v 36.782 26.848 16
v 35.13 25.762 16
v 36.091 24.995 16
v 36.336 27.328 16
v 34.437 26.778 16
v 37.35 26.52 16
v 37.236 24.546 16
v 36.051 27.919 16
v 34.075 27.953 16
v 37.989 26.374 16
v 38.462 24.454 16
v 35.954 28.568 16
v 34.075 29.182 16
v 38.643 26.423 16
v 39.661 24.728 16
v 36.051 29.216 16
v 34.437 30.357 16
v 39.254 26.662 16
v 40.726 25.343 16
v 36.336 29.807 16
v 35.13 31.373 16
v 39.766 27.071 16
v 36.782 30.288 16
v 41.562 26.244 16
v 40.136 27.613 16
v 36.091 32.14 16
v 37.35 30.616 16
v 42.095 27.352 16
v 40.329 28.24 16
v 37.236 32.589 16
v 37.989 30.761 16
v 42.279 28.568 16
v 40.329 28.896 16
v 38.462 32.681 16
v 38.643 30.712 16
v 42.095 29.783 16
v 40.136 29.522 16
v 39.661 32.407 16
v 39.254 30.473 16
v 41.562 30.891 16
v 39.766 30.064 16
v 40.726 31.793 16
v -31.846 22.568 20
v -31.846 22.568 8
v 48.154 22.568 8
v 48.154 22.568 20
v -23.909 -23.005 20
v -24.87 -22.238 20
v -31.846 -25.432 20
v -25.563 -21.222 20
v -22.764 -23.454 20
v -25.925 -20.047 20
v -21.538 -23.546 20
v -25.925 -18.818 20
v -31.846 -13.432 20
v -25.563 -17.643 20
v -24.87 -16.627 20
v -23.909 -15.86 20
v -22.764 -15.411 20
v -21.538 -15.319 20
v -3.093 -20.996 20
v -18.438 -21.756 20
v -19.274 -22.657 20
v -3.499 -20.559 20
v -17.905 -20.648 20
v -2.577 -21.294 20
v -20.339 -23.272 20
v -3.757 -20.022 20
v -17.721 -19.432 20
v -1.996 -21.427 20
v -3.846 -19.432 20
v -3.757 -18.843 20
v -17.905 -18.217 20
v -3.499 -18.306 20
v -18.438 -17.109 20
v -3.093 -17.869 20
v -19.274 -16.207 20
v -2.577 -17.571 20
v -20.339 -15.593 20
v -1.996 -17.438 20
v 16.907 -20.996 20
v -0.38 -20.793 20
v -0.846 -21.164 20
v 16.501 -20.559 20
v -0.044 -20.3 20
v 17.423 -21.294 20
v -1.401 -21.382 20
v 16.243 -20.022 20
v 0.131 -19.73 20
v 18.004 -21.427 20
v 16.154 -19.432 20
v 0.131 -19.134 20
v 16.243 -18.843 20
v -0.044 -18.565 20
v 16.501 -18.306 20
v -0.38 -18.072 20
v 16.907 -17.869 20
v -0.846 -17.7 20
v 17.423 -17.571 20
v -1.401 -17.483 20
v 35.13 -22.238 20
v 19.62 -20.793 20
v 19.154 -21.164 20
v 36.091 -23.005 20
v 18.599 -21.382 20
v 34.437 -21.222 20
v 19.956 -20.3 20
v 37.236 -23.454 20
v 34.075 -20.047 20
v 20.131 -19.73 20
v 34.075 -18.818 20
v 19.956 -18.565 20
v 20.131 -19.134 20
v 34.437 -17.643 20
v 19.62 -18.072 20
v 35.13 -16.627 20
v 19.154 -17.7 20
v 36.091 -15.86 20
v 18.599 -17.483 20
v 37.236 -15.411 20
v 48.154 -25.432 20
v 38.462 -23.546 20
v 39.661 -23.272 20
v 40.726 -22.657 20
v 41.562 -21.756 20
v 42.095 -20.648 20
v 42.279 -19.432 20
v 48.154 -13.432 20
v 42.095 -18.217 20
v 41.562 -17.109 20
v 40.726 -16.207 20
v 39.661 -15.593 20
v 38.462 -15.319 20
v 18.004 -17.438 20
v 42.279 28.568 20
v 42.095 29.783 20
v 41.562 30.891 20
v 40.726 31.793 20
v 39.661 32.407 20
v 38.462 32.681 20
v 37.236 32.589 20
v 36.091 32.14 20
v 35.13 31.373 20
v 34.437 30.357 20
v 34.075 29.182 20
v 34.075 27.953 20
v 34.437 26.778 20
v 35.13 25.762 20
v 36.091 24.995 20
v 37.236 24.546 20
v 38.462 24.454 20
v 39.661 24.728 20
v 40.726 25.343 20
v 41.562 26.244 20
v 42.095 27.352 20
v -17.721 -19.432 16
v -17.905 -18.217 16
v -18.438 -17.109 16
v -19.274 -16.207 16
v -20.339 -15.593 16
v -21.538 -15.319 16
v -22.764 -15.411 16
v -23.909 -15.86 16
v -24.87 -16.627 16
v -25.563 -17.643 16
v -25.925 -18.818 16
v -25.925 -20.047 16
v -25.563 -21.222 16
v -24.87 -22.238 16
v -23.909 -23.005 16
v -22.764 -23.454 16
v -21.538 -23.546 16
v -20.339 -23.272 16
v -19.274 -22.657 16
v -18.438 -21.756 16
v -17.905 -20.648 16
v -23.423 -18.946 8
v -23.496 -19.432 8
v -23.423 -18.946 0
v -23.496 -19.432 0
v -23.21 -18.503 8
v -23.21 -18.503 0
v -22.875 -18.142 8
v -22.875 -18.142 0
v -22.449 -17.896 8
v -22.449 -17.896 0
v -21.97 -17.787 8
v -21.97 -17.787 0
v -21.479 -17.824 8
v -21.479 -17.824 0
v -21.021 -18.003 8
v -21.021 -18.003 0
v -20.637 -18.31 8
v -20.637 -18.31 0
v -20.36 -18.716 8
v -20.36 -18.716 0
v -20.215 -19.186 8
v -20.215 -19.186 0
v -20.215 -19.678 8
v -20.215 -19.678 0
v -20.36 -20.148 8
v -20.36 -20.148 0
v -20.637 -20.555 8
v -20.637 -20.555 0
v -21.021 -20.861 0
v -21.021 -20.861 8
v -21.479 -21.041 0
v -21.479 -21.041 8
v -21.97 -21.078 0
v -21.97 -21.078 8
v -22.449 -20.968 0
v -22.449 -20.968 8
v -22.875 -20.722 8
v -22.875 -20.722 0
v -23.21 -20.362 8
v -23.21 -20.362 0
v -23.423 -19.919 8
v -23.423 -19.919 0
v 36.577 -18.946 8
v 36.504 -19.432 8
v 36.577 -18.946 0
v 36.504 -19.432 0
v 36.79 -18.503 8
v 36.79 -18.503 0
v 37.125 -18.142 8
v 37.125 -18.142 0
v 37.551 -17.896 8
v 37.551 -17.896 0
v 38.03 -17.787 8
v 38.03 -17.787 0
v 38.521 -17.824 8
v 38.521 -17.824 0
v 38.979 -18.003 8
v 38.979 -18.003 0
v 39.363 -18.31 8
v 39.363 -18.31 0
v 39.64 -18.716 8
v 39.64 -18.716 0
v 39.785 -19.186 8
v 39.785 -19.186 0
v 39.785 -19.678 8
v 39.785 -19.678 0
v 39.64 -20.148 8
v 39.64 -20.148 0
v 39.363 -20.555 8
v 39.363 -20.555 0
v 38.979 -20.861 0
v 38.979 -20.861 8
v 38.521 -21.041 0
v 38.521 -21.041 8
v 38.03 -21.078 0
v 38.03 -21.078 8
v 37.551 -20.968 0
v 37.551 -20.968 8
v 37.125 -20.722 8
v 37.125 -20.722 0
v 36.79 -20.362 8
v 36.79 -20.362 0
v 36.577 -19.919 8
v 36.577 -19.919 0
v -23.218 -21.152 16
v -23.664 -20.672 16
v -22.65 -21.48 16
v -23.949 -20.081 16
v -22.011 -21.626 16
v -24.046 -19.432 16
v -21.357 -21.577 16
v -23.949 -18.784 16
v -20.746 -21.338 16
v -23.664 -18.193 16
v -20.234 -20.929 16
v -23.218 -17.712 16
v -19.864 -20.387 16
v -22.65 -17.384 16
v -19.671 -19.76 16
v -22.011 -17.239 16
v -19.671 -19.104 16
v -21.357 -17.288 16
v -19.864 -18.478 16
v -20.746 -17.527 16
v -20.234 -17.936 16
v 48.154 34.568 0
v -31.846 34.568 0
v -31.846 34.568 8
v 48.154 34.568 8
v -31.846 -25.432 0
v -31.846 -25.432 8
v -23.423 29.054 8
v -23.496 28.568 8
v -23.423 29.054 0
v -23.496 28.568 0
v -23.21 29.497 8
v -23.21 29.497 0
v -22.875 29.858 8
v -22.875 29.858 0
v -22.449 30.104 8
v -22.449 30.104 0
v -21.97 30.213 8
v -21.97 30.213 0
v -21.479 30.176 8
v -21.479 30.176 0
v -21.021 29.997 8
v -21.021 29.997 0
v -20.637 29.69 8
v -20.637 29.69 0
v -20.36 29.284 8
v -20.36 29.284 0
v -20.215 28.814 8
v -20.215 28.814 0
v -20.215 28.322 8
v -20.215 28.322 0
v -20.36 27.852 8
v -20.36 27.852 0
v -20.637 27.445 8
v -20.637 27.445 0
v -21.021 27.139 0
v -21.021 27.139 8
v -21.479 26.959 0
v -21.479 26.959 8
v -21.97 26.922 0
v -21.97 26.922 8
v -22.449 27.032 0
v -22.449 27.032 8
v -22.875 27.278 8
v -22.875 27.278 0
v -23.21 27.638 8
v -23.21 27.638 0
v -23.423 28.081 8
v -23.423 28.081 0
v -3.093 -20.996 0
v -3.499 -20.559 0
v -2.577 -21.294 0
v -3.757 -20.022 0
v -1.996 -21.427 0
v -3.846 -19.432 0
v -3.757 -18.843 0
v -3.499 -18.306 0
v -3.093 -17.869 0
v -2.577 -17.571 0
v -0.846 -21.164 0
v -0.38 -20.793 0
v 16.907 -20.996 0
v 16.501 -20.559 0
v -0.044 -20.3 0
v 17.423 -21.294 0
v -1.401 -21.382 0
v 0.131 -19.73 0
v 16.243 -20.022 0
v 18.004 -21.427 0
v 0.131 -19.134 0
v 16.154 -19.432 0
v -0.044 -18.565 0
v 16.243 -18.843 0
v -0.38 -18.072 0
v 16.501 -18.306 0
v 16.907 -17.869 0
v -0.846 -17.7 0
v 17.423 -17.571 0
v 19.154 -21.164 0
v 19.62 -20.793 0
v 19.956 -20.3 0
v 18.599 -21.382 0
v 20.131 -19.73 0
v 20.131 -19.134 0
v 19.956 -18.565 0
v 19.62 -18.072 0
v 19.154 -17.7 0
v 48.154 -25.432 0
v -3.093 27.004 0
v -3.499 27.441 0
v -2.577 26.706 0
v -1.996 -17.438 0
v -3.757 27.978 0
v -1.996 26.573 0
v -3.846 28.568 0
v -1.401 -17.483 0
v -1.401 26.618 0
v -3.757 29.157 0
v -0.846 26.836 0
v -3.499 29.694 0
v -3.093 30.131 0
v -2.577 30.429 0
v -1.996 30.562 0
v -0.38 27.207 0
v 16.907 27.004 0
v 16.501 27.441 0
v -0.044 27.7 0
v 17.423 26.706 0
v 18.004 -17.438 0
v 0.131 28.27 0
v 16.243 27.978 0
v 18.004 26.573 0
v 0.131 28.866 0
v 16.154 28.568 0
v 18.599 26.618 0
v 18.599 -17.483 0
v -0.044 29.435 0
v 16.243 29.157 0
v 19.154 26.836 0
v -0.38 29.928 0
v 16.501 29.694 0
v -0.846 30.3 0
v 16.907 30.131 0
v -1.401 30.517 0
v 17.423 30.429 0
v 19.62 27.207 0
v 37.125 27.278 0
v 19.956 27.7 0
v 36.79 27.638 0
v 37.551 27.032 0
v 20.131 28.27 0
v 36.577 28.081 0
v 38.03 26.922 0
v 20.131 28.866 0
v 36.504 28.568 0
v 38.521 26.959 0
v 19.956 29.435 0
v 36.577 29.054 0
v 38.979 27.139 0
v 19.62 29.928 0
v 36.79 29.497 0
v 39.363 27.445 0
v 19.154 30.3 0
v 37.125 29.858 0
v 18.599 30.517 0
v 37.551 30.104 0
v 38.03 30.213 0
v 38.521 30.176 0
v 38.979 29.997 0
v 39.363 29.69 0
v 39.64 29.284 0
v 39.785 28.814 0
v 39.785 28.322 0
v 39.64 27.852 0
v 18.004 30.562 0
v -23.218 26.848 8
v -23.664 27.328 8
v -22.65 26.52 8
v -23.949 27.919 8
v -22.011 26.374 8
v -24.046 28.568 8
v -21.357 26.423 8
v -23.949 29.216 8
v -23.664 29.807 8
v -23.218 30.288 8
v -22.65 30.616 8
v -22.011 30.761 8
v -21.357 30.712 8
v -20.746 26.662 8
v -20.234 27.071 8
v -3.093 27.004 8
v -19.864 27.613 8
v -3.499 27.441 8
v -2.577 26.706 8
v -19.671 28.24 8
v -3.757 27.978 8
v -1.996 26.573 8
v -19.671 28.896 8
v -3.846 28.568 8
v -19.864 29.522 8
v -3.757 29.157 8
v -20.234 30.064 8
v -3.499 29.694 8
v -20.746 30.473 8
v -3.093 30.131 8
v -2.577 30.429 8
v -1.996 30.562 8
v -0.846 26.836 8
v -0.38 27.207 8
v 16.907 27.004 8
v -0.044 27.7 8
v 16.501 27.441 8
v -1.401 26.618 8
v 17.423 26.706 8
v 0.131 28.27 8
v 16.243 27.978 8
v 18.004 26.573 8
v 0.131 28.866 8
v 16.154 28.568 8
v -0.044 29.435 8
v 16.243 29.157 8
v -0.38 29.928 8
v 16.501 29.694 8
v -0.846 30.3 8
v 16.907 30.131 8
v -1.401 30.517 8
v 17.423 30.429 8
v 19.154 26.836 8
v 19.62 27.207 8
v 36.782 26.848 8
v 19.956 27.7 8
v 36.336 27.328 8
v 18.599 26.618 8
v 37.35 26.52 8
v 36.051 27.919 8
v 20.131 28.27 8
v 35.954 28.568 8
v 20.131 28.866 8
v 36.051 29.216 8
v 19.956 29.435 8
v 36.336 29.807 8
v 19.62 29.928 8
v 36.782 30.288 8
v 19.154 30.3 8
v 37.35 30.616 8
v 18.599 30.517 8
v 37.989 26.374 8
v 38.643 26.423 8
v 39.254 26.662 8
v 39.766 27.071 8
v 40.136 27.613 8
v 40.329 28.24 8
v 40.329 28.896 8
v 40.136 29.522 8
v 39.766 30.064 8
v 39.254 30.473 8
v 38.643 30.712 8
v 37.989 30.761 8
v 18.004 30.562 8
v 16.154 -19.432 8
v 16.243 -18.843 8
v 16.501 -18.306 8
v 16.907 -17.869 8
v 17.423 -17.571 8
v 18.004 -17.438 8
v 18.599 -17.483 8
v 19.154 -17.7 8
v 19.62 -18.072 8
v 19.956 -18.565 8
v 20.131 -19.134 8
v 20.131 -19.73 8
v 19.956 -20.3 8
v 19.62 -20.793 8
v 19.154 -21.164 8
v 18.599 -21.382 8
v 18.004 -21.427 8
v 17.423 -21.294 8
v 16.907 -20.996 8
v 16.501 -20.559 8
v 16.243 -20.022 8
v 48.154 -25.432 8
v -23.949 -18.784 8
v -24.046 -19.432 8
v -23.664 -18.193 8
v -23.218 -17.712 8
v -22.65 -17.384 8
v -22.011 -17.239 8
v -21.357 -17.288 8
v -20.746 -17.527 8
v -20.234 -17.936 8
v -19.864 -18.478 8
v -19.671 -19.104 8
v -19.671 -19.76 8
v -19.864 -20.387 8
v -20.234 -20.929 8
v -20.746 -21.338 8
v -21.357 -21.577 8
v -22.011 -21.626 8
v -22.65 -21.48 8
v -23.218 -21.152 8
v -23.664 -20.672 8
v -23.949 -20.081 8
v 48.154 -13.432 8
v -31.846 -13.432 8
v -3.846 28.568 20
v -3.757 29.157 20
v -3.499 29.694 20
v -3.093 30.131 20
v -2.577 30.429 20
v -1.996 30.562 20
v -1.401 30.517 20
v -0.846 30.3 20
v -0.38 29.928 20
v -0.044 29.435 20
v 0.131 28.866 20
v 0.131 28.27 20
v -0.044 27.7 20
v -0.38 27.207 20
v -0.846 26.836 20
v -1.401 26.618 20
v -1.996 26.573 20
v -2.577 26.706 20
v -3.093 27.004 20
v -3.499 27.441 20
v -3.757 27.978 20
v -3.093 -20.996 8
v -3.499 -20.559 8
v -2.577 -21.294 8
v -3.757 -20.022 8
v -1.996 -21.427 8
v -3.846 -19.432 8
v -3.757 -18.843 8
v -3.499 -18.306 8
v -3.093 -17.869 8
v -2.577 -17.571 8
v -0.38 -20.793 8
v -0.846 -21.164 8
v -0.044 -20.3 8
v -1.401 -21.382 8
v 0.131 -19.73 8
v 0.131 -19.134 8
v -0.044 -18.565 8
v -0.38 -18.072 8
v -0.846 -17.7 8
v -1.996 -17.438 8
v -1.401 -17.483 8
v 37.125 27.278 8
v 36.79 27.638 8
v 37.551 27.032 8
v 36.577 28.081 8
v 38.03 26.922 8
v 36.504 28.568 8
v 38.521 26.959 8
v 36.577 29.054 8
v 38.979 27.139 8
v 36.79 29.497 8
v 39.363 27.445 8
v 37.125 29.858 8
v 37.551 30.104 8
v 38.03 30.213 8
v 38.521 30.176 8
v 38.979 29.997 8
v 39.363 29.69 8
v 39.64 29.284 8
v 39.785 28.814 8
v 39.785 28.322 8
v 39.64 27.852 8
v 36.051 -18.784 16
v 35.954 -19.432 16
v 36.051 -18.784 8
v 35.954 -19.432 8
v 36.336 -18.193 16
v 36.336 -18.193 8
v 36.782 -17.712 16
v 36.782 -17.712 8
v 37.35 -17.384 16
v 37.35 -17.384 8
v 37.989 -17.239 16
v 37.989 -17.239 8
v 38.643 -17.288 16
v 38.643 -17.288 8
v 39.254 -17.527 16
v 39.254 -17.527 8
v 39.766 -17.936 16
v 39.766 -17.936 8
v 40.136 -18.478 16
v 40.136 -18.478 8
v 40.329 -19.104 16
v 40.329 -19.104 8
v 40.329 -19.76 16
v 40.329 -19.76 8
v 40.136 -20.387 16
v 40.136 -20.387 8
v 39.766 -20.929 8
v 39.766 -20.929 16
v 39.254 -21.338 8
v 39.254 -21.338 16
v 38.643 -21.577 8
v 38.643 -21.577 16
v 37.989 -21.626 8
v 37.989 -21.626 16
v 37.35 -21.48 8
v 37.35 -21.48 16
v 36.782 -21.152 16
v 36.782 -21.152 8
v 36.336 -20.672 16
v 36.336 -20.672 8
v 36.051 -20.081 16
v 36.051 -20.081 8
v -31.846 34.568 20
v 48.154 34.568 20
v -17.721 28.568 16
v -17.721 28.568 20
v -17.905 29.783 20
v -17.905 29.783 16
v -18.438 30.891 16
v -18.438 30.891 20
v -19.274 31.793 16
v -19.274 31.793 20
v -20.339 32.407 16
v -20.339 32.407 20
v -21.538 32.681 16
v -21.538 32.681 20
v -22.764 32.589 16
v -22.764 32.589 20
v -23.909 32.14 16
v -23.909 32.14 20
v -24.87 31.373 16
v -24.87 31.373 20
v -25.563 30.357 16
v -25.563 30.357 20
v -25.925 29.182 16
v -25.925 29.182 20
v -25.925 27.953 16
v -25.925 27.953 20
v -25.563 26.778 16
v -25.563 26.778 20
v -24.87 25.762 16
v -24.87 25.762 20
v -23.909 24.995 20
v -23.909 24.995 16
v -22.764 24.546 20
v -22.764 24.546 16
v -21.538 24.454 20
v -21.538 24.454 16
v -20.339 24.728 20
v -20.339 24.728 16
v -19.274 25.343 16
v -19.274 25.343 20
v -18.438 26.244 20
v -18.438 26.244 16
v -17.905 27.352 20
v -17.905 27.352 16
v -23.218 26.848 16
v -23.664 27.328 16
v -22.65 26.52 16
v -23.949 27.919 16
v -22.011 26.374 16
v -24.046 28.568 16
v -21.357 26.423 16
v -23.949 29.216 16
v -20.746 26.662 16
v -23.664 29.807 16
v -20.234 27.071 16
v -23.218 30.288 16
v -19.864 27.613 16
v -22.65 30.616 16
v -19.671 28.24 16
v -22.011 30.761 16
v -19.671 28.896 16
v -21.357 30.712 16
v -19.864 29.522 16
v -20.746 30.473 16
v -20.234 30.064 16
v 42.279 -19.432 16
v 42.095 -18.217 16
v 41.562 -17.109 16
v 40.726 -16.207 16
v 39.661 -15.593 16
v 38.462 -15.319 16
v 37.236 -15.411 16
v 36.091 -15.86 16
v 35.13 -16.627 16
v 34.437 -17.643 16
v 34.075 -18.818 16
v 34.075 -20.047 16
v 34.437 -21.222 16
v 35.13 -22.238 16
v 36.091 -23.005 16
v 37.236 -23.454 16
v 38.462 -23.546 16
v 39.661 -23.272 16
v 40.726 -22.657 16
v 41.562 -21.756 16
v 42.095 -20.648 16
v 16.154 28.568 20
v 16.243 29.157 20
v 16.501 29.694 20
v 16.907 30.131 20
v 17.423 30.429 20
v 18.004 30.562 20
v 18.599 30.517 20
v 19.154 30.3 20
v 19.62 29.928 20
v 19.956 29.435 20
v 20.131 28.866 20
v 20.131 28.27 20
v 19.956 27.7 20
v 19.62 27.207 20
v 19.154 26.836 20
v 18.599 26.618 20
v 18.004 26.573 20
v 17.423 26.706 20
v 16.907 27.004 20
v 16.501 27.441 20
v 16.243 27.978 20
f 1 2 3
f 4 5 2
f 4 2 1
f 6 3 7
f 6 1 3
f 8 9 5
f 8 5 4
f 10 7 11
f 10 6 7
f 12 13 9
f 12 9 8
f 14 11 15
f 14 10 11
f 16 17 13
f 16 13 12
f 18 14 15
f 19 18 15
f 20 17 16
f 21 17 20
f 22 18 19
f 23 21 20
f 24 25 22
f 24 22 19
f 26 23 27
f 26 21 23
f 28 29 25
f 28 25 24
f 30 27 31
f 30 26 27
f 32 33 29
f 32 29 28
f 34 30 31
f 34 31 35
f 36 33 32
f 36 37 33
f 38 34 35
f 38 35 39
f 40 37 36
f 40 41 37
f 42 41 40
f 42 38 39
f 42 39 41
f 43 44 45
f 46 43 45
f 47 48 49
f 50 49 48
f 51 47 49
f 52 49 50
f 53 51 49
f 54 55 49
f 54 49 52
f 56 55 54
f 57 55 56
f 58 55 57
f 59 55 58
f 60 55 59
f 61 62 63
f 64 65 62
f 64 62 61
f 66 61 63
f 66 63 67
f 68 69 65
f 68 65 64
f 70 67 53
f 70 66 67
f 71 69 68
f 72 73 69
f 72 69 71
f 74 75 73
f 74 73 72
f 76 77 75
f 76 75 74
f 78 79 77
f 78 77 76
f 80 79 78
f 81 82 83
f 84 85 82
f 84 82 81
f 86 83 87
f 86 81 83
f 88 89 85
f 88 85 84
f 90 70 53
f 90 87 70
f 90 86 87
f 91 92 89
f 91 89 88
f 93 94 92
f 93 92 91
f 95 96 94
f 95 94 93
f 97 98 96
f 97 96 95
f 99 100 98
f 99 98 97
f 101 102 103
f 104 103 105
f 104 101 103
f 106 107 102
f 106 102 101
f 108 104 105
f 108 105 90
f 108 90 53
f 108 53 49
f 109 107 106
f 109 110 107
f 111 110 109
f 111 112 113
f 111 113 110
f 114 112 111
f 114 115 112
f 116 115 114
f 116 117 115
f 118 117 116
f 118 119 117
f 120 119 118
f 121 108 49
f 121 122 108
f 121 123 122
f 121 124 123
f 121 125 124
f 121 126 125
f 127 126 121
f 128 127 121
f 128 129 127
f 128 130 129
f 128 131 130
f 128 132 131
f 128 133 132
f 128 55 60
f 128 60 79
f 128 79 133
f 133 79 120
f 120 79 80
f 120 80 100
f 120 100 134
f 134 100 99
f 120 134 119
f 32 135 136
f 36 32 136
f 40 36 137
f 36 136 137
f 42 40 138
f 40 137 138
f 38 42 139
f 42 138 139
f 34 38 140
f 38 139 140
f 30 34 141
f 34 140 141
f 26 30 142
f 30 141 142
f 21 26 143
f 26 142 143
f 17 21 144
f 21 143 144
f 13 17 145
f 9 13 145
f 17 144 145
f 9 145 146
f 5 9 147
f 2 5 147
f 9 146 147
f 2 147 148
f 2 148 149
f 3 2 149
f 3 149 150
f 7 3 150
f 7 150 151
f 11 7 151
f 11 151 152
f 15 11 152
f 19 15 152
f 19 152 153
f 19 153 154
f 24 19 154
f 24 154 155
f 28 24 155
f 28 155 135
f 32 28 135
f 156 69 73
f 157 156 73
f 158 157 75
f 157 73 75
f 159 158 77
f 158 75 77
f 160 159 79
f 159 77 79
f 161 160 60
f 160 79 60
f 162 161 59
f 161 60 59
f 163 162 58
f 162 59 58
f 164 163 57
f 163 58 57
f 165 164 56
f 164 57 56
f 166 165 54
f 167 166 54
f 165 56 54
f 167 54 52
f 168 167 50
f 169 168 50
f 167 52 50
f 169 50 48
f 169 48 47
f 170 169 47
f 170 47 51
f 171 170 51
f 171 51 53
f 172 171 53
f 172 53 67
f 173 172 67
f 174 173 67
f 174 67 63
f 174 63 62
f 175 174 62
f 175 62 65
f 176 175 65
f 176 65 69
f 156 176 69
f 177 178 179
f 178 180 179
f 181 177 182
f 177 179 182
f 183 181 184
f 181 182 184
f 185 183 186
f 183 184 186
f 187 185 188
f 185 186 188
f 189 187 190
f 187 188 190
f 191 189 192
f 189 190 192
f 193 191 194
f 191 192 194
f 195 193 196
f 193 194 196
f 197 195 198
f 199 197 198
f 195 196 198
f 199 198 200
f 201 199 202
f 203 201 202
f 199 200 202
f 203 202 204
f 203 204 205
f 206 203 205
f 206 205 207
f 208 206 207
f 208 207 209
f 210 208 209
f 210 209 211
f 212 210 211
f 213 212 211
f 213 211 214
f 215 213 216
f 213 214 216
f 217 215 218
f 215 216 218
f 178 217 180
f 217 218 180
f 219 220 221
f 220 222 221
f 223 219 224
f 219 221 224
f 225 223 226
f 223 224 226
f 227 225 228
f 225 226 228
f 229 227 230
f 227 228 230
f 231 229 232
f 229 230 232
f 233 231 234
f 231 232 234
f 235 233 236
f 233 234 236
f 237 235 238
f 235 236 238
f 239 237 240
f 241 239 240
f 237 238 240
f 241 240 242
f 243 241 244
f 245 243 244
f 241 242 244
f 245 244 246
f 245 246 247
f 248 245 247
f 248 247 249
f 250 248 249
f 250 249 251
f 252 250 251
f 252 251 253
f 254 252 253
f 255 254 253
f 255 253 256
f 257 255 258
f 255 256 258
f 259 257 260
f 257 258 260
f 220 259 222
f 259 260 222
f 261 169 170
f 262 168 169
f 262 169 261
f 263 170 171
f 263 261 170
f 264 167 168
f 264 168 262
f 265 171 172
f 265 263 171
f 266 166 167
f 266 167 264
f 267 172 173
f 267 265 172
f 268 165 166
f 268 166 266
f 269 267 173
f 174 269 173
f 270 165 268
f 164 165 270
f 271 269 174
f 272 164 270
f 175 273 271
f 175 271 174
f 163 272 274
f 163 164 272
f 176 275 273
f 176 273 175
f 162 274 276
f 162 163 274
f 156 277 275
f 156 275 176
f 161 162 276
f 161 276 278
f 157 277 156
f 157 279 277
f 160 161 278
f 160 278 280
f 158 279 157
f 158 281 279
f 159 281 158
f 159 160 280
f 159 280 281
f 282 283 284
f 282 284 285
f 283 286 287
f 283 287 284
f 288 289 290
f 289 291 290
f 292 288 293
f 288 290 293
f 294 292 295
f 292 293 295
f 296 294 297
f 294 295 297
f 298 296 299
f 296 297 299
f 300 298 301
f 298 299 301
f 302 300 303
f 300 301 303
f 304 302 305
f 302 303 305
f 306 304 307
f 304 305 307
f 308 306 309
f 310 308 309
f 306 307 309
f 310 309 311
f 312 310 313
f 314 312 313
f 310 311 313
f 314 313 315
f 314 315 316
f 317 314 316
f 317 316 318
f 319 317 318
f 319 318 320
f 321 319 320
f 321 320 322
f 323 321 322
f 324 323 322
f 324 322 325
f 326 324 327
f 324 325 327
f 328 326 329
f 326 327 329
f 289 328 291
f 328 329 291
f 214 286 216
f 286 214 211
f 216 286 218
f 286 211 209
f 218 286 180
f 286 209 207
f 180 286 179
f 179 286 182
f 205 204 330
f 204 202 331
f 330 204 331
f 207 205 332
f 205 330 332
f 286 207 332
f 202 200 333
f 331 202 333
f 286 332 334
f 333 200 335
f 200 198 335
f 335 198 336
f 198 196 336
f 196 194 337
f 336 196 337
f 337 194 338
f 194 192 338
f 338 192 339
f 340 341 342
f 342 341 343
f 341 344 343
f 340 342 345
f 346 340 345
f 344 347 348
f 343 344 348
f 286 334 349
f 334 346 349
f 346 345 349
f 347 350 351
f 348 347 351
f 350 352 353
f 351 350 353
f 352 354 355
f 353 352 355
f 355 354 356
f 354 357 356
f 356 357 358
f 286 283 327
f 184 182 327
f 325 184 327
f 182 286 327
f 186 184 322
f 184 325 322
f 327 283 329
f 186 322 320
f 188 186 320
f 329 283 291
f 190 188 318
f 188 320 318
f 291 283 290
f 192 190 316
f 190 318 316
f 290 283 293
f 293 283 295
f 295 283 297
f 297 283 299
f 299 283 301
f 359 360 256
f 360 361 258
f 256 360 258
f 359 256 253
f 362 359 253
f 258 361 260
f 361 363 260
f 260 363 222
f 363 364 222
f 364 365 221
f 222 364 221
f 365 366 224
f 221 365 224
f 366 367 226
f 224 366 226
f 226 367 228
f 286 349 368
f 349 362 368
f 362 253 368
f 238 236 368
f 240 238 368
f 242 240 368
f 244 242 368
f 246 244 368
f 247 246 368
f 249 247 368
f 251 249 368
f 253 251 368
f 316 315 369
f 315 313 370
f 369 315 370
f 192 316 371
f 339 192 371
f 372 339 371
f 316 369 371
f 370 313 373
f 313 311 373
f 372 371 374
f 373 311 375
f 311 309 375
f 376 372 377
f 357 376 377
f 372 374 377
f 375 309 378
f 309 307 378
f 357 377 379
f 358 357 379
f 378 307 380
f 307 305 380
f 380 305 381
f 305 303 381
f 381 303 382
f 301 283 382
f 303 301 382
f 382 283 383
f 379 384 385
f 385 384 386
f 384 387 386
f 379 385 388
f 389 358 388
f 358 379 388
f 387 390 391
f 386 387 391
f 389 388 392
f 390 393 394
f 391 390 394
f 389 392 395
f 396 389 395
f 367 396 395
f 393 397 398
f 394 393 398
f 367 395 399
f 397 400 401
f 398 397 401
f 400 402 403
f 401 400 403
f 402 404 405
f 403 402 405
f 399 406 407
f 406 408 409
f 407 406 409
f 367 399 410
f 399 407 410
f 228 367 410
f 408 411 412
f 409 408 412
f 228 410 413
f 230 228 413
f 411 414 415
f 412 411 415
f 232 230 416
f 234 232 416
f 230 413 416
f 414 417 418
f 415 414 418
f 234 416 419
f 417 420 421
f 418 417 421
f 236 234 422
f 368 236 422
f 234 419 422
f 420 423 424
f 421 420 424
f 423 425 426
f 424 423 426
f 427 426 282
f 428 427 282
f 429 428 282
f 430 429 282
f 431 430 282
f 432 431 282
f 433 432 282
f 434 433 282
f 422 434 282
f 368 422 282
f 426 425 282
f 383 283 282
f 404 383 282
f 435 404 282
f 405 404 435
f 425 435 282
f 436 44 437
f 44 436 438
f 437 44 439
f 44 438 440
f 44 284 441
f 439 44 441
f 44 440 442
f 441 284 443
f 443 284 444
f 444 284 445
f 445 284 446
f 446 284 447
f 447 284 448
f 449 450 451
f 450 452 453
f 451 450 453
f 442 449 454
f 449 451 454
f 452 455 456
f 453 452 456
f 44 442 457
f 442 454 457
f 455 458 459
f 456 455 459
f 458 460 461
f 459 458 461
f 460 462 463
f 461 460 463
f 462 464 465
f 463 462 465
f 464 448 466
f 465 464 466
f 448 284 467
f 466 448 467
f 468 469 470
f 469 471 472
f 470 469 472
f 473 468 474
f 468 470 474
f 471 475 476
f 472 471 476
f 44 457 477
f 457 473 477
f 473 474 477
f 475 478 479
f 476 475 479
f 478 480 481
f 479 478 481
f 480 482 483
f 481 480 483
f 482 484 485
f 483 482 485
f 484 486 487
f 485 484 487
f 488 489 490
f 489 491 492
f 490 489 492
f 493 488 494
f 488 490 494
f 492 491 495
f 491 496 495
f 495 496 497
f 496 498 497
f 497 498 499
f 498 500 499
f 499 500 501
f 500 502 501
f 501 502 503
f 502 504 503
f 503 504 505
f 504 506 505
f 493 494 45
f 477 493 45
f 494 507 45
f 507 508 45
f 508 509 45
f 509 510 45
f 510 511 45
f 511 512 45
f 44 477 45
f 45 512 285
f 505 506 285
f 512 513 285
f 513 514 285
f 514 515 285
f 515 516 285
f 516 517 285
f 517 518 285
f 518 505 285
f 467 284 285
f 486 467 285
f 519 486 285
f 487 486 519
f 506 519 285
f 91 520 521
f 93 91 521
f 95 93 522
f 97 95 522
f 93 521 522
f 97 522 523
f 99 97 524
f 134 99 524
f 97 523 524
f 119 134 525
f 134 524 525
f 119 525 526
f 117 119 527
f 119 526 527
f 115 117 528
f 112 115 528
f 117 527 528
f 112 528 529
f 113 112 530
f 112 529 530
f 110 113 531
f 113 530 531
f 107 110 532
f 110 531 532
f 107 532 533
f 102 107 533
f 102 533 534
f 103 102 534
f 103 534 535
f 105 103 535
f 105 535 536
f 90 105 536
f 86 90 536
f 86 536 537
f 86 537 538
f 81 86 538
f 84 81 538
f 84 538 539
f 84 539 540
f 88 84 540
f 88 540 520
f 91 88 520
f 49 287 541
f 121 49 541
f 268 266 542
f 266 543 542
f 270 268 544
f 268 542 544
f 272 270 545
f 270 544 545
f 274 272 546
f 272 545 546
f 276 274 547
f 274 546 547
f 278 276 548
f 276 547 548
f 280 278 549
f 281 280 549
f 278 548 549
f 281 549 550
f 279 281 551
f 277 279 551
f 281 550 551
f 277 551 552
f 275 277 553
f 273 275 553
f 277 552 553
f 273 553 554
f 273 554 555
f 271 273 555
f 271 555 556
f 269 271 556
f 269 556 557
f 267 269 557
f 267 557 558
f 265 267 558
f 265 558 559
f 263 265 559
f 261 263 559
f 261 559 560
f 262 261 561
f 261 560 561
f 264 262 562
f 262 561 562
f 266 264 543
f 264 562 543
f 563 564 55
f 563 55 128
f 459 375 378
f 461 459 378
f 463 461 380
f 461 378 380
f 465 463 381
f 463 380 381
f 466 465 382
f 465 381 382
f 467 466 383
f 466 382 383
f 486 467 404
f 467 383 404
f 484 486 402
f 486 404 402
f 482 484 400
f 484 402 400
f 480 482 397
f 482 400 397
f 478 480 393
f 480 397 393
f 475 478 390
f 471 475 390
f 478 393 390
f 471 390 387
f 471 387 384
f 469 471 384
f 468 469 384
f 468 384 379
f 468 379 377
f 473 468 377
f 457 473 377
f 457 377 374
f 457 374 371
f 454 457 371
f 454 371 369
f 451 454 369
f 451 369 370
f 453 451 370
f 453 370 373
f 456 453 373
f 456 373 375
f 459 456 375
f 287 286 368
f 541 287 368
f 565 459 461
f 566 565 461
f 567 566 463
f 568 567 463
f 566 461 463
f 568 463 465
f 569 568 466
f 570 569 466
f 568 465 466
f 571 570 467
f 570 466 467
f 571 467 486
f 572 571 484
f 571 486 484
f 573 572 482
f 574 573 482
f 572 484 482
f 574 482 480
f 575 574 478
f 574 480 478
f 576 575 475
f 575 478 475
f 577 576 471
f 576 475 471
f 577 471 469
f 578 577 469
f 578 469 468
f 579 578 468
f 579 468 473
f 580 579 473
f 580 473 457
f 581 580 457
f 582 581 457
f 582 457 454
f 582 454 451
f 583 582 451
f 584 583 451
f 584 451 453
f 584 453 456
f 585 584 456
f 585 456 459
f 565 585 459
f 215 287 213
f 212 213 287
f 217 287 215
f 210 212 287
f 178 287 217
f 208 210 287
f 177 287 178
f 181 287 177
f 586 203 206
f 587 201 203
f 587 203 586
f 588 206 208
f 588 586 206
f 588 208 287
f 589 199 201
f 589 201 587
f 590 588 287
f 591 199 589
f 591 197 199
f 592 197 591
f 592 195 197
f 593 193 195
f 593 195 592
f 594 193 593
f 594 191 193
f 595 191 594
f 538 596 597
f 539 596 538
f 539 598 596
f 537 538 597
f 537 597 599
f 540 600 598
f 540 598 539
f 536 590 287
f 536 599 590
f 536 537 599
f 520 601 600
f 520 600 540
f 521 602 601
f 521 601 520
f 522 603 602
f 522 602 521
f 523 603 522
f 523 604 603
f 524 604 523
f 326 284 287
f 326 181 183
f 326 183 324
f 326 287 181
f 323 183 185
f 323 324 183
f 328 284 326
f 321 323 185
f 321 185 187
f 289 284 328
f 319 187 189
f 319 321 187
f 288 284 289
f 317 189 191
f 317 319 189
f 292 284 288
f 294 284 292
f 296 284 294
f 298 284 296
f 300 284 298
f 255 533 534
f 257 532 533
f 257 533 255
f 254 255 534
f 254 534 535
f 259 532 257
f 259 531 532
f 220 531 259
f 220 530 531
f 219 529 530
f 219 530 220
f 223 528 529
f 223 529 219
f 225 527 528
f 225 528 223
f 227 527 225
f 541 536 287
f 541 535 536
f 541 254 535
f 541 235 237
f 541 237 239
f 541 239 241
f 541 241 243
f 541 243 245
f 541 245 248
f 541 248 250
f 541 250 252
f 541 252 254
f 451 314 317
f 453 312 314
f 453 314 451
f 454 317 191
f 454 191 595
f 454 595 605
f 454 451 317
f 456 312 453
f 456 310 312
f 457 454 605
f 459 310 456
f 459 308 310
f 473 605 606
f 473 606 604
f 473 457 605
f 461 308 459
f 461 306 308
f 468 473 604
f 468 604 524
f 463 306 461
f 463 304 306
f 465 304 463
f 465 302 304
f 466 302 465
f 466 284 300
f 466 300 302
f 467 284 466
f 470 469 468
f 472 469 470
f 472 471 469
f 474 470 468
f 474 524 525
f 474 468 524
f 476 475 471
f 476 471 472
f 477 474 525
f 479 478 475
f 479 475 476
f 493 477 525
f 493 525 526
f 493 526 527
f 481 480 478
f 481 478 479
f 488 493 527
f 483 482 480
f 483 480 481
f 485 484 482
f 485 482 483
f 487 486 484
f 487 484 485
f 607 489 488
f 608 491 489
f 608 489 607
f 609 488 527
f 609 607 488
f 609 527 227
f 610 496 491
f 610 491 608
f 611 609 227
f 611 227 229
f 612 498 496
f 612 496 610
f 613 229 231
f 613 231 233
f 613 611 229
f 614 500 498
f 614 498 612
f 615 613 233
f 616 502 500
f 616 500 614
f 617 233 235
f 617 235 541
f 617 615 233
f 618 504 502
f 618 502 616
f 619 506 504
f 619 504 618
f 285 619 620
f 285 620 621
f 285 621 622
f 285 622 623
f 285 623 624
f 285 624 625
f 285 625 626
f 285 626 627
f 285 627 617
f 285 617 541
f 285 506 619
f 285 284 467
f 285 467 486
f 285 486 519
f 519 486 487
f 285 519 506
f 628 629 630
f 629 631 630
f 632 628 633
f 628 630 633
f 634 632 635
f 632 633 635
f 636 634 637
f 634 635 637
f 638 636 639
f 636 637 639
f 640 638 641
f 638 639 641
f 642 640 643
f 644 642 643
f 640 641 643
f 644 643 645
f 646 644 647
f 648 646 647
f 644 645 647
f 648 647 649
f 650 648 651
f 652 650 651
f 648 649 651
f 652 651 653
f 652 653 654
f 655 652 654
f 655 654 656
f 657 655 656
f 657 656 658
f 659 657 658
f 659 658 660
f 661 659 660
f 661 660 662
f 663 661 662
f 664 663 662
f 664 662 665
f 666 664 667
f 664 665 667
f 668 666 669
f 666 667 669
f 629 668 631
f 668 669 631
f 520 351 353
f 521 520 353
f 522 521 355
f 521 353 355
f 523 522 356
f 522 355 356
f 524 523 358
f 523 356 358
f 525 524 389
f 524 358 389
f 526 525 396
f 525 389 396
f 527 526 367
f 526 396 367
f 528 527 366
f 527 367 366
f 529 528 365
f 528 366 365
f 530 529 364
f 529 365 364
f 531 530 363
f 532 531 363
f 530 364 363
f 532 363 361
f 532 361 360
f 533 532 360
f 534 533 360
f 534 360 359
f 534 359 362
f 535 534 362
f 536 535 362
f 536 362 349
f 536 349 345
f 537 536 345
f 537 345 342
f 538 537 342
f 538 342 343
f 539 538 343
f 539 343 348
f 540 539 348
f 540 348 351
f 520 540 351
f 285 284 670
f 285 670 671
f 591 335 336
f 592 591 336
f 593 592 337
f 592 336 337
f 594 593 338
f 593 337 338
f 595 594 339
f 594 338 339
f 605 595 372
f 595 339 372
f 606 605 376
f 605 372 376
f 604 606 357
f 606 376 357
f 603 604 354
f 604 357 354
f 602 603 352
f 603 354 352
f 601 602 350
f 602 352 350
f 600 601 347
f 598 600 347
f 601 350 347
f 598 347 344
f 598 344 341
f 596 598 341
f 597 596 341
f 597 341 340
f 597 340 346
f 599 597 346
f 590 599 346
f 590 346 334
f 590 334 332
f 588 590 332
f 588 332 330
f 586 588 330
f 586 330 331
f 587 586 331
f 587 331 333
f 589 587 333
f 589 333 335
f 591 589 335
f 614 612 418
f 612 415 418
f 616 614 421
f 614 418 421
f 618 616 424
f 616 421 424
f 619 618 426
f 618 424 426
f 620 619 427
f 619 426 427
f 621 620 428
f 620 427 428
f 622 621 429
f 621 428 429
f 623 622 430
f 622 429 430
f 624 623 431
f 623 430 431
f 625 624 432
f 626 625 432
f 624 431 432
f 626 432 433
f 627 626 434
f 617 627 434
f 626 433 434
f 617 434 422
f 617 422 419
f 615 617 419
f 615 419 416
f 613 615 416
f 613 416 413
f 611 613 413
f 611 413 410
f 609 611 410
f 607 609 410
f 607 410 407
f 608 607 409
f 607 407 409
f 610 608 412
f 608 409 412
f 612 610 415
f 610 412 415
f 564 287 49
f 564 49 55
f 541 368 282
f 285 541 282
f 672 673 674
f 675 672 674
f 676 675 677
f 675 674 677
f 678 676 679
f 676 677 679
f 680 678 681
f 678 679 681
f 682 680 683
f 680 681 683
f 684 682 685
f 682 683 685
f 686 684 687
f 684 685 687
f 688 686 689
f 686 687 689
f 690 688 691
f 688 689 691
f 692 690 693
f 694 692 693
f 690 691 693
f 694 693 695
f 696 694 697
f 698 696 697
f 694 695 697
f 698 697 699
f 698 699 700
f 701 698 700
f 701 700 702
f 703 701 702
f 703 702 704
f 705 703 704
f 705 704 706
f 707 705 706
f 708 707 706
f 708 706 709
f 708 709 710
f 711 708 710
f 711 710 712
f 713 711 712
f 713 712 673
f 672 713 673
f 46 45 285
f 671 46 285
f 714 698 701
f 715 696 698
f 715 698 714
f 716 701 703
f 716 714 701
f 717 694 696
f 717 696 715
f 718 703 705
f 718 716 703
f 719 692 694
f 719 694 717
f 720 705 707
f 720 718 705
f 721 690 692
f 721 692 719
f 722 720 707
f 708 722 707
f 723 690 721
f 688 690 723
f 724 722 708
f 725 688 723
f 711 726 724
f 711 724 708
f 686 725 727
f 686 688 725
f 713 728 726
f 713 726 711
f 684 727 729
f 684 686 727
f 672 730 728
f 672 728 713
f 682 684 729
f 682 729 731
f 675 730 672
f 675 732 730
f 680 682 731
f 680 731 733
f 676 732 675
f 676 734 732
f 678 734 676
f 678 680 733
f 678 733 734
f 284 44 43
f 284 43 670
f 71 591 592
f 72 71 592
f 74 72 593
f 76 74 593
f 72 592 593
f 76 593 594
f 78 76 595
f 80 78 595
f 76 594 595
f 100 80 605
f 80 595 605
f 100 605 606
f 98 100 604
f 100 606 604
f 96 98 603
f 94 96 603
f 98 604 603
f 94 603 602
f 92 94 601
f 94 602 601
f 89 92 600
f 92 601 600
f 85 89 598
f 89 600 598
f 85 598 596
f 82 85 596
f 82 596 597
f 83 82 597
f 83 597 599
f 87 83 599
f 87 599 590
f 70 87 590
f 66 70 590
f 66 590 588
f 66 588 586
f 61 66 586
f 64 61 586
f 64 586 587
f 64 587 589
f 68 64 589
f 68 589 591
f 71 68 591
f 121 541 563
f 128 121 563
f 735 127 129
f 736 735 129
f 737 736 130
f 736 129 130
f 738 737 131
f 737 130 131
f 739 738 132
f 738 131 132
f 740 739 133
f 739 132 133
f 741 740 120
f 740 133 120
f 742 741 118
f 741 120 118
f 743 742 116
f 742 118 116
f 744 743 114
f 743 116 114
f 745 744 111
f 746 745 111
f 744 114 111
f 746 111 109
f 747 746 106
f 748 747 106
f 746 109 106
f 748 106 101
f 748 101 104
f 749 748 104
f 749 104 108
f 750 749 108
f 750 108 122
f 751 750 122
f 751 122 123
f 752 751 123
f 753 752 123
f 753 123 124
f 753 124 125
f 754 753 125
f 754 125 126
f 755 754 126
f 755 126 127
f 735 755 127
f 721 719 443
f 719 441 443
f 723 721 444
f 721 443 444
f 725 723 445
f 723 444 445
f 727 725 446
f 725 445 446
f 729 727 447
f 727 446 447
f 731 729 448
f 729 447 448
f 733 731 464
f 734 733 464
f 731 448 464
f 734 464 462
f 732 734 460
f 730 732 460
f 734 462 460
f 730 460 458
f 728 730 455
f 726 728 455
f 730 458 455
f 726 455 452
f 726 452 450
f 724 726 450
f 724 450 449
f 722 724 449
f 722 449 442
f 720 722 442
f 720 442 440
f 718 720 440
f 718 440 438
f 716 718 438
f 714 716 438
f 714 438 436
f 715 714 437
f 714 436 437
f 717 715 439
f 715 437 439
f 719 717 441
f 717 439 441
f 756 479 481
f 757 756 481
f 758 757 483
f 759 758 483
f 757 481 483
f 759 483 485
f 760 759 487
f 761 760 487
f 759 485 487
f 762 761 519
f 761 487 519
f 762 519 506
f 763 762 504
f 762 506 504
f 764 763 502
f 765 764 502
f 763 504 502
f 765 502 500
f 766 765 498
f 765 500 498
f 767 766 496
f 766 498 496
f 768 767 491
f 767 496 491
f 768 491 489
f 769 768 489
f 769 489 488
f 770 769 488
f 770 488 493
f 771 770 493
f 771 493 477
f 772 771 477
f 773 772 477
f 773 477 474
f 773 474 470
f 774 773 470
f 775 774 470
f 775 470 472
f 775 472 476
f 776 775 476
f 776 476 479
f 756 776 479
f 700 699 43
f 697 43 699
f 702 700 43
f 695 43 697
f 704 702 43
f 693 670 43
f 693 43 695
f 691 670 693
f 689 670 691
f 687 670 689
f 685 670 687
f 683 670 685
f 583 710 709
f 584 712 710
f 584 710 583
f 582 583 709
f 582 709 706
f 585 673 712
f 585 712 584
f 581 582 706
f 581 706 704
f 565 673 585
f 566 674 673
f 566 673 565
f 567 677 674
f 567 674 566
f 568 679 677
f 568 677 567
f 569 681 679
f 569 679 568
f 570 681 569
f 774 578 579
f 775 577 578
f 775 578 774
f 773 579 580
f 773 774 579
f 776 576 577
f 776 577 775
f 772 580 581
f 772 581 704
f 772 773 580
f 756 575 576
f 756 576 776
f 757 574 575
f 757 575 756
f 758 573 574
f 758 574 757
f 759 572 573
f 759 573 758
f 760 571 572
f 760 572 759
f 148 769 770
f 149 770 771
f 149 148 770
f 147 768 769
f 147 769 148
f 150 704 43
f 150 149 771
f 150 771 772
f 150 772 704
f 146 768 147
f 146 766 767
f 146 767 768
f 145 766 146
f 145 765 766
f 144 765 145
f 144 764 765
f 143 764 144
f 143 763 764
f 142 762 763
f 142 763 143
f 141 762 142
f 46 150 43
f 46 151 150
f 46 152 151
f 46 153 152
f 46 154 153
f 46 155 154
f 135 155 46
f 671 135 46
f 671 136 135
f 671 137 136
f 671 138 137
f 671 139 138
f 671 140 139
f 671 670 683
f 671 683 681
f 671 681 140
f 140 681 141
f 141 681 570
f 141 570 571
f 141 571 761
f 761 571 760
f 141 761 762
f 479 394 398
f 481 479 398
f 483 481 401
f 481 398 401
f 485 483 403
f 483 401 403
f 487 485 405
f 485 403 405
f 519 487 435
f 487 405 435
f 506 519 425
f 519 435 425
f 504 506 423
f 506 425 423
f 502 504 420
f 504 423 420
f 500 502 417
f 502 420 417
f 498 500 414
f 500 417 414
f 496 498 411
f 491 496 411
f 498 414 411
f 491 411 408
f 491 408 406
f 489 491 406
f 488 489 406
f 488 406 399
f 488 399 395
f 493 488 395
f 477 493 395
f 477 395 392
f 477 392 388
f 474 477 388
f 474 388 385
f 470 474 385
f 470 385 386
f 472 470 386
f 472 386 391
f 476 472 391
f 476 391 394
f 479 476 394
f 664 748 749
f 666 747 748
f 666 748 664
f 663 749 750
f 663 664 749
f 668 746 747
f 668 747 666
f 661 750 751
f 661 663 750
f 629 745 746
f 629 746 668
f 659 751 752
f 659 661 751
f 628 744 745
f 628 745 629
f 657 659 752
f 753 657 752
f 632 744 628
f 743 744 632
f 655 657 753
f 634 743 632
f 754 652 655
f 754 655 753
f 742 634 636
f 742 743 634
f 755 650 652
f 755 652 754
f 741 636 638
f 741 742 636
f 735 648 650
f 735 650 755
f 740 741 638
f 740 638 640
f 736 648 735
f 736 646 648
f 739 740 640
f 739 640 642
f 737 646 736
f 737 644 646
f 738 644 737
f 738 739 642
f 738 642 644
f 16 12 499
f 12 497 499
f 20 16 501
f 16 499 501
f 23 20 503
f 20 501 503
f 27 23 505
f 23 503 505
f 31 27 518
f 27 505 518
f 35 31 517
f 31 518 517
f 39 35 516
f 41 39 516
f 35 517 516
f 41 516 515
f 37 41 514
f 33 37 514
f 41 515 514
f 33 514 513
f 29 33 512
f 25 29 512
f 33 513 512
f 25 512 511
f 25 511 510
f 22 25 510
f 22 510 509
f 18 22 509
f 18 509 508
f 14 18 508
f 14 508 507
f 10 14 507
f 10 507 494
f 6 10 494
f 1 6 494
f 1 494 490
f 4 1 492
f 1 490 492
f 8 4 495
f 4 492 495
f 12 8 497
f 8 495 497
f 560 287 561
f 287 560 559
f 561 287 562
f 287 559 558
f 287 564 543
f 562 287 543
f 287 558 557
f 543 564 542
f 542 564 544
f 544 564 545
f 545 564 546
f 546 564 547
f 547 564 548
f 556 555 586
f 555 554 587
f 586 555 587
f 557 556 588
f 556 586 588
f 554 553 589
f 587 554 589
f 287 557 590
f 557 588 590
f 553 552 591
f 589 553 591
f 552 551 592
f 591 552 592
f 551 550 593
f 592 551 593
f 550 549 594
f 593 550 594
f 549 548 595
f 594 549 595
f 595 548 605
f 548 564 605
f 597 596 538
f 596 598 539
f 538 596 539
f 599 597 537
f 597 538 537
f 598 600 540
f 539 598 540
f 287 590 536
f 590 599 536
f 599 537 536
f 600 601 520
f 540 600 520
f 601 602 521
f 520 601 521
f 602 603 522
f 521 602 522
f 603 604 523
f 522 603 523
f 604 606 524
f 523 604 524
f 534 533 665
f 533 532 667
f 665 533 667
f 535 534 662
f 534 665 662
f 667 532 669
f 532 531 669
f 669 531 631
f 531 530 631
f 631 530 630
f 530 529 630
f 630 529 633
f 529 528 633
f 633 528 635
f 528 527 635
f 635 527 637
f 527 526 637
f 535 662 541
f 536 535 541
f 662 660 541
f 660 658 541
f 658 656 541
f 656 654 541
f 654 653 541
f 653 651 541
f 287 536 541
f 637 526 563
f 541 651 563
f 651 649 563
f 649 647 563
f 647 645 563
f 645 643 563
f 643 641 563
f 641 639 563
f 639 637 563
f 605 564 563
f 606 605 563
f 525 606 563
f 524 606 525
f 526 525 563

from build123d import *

# Parameters (mm, degrees)
F0_W             = 80
F0_H             = 60
F1_DEPTH         = 8
F2_W             = 80
F2_H             = 12
F3_DEPTH         = 12
F5_D             = 4.4
F5_DEPTH         = 12
F5_CBORE_D       = 8.25
F5_CBORE_DEPTH   = 4
F5_TIP           = 1.3218933619
F5_2_D           = 4.4
F5_2_DEPTH       = 12
F5_2_CBORE_D     = 8.25
F5_2_CBORE_DEPTH = 4
F5_2_TIP         = 1.3218933619
F7_D             = 4
F7_2_D           = 4
F7_3_D           = 4
F8_D             = 3.3
F8_CBORE_D       = 8.25
F8_CBORE_DEPTH   = 4


with BuildPart() as f1:
    # F0 (on Top) → F1 (new body)
    with BuildSketch(Plane.XY):
        with Locations((8.1536909938, 4.5676219463)):
            Rectangle(F0_W, F0_H)
    extrude(amount=F1_DEPTH)

    # F7 (through all)
    with Locations(Plane.XY.offset(20)):
        with Locations((-1.8463090062, 28.5676219463), (18.1536909938, 28.5676219463), (18.1536909938, -19.4323780537), (-1.8463090062, -19.4323780537)):
            Hole(F7_D / 2)

    # F8 (through all)
    with Locations(Plane.XY.offset(20)):
        with Locations((-21.8463090062, 28.5676219463), (38.1536909938, 28.5676219463), (38.1536909938, -19.4323780537), (-21.8463090062, -19.4323780537)):
            CounterBoreHole(F8_D / 2, F8_CBORE_D / 2, F8_CBORE_DEPTH)


with BuildPart() as f3:
    # F2 (on face) → F3 (new body)
    with BuildSketch(Plane.XY.offset(8)):
        with Locations((8.1536909938, 28.5676219463)):
            Rectangle(F2_W, F2_H)
    extrude(amount=F3_DEPTH)

    # F5
    with Locations(Plane.XY.offset(20)):
        with Locations((-21.8463090062, 28.5676219463), (38.1536909938, 28.5676219463), (38.1536909938, -19.4323780537), (-21.8463090062, -19.4323780537)):
            CounterBoreHole(F5_D / 2, F5_CBORE_D / 2, F5_CBORE_DEPTH, depth=F5_DEPTH)
            with Locations((0, 0, -(F5_DEPTH + F5_TIP / 2))):  # 118° drill point
                Cone(0, F5_D / 2, F5_TIP, mode=Mode.SUBTRACT)

    # F7#2 (through all)
    with Locations(Plane.XY.offset(20)):
        with Locations((-1.8463090062, 28.5676219463), (18.1536909938, 28.5676219463), (18.1536909938, -19.4323780537), (-1.8463090062, -19.4323780537)):
            Hole(F7_2_D / 2)


with BuildPart() as f3b:
    # F2 (on face) → F3, piece 2 (new body)
    with BuildSketch(Plane.XY.offset(8)):
        with Locations((8.1536909938, -19.4323780537)):
            Rectangle(F2_W, F2_H)
    extrude(amount=F3_DEPTH)

    # F5#2
    with Locations(Plane.XY.offset(20)):
        with Locations((-21.8463090062, 28.5676219463), (38.1536909938, 28.5676219463), (38.1536909938, -19.4323780537), (-21.8463090062, -19.4323780537)):
            CounterBoreHole(F5_2_D / 2, F5_2_CBORE_D / 2, F5_2_CBORE_DEPTH, depth=F5_2_DEPTH)
            with Locations((0, 0, -(F5_2_DEPTH + F5_2_TIP / 2))):  # 118° drill point
                Cone(0, F5_2_D / 2, F5_2_TIP, mode=Mode.SUBTRACT)

    # F7#3 (through all)
    with Locations(Plane.XY.offset(20)):
        with Locations((-1.8463090062, 28.5676219463), (18.1536909938, 28.5676219463), (18.1536909938, -19.4323780537), (-1.8463090062, -19.4323780537)):
            Hole(F7_3_D / 2)


solid = Compound([f1.part, f3.part, f3b.part])
